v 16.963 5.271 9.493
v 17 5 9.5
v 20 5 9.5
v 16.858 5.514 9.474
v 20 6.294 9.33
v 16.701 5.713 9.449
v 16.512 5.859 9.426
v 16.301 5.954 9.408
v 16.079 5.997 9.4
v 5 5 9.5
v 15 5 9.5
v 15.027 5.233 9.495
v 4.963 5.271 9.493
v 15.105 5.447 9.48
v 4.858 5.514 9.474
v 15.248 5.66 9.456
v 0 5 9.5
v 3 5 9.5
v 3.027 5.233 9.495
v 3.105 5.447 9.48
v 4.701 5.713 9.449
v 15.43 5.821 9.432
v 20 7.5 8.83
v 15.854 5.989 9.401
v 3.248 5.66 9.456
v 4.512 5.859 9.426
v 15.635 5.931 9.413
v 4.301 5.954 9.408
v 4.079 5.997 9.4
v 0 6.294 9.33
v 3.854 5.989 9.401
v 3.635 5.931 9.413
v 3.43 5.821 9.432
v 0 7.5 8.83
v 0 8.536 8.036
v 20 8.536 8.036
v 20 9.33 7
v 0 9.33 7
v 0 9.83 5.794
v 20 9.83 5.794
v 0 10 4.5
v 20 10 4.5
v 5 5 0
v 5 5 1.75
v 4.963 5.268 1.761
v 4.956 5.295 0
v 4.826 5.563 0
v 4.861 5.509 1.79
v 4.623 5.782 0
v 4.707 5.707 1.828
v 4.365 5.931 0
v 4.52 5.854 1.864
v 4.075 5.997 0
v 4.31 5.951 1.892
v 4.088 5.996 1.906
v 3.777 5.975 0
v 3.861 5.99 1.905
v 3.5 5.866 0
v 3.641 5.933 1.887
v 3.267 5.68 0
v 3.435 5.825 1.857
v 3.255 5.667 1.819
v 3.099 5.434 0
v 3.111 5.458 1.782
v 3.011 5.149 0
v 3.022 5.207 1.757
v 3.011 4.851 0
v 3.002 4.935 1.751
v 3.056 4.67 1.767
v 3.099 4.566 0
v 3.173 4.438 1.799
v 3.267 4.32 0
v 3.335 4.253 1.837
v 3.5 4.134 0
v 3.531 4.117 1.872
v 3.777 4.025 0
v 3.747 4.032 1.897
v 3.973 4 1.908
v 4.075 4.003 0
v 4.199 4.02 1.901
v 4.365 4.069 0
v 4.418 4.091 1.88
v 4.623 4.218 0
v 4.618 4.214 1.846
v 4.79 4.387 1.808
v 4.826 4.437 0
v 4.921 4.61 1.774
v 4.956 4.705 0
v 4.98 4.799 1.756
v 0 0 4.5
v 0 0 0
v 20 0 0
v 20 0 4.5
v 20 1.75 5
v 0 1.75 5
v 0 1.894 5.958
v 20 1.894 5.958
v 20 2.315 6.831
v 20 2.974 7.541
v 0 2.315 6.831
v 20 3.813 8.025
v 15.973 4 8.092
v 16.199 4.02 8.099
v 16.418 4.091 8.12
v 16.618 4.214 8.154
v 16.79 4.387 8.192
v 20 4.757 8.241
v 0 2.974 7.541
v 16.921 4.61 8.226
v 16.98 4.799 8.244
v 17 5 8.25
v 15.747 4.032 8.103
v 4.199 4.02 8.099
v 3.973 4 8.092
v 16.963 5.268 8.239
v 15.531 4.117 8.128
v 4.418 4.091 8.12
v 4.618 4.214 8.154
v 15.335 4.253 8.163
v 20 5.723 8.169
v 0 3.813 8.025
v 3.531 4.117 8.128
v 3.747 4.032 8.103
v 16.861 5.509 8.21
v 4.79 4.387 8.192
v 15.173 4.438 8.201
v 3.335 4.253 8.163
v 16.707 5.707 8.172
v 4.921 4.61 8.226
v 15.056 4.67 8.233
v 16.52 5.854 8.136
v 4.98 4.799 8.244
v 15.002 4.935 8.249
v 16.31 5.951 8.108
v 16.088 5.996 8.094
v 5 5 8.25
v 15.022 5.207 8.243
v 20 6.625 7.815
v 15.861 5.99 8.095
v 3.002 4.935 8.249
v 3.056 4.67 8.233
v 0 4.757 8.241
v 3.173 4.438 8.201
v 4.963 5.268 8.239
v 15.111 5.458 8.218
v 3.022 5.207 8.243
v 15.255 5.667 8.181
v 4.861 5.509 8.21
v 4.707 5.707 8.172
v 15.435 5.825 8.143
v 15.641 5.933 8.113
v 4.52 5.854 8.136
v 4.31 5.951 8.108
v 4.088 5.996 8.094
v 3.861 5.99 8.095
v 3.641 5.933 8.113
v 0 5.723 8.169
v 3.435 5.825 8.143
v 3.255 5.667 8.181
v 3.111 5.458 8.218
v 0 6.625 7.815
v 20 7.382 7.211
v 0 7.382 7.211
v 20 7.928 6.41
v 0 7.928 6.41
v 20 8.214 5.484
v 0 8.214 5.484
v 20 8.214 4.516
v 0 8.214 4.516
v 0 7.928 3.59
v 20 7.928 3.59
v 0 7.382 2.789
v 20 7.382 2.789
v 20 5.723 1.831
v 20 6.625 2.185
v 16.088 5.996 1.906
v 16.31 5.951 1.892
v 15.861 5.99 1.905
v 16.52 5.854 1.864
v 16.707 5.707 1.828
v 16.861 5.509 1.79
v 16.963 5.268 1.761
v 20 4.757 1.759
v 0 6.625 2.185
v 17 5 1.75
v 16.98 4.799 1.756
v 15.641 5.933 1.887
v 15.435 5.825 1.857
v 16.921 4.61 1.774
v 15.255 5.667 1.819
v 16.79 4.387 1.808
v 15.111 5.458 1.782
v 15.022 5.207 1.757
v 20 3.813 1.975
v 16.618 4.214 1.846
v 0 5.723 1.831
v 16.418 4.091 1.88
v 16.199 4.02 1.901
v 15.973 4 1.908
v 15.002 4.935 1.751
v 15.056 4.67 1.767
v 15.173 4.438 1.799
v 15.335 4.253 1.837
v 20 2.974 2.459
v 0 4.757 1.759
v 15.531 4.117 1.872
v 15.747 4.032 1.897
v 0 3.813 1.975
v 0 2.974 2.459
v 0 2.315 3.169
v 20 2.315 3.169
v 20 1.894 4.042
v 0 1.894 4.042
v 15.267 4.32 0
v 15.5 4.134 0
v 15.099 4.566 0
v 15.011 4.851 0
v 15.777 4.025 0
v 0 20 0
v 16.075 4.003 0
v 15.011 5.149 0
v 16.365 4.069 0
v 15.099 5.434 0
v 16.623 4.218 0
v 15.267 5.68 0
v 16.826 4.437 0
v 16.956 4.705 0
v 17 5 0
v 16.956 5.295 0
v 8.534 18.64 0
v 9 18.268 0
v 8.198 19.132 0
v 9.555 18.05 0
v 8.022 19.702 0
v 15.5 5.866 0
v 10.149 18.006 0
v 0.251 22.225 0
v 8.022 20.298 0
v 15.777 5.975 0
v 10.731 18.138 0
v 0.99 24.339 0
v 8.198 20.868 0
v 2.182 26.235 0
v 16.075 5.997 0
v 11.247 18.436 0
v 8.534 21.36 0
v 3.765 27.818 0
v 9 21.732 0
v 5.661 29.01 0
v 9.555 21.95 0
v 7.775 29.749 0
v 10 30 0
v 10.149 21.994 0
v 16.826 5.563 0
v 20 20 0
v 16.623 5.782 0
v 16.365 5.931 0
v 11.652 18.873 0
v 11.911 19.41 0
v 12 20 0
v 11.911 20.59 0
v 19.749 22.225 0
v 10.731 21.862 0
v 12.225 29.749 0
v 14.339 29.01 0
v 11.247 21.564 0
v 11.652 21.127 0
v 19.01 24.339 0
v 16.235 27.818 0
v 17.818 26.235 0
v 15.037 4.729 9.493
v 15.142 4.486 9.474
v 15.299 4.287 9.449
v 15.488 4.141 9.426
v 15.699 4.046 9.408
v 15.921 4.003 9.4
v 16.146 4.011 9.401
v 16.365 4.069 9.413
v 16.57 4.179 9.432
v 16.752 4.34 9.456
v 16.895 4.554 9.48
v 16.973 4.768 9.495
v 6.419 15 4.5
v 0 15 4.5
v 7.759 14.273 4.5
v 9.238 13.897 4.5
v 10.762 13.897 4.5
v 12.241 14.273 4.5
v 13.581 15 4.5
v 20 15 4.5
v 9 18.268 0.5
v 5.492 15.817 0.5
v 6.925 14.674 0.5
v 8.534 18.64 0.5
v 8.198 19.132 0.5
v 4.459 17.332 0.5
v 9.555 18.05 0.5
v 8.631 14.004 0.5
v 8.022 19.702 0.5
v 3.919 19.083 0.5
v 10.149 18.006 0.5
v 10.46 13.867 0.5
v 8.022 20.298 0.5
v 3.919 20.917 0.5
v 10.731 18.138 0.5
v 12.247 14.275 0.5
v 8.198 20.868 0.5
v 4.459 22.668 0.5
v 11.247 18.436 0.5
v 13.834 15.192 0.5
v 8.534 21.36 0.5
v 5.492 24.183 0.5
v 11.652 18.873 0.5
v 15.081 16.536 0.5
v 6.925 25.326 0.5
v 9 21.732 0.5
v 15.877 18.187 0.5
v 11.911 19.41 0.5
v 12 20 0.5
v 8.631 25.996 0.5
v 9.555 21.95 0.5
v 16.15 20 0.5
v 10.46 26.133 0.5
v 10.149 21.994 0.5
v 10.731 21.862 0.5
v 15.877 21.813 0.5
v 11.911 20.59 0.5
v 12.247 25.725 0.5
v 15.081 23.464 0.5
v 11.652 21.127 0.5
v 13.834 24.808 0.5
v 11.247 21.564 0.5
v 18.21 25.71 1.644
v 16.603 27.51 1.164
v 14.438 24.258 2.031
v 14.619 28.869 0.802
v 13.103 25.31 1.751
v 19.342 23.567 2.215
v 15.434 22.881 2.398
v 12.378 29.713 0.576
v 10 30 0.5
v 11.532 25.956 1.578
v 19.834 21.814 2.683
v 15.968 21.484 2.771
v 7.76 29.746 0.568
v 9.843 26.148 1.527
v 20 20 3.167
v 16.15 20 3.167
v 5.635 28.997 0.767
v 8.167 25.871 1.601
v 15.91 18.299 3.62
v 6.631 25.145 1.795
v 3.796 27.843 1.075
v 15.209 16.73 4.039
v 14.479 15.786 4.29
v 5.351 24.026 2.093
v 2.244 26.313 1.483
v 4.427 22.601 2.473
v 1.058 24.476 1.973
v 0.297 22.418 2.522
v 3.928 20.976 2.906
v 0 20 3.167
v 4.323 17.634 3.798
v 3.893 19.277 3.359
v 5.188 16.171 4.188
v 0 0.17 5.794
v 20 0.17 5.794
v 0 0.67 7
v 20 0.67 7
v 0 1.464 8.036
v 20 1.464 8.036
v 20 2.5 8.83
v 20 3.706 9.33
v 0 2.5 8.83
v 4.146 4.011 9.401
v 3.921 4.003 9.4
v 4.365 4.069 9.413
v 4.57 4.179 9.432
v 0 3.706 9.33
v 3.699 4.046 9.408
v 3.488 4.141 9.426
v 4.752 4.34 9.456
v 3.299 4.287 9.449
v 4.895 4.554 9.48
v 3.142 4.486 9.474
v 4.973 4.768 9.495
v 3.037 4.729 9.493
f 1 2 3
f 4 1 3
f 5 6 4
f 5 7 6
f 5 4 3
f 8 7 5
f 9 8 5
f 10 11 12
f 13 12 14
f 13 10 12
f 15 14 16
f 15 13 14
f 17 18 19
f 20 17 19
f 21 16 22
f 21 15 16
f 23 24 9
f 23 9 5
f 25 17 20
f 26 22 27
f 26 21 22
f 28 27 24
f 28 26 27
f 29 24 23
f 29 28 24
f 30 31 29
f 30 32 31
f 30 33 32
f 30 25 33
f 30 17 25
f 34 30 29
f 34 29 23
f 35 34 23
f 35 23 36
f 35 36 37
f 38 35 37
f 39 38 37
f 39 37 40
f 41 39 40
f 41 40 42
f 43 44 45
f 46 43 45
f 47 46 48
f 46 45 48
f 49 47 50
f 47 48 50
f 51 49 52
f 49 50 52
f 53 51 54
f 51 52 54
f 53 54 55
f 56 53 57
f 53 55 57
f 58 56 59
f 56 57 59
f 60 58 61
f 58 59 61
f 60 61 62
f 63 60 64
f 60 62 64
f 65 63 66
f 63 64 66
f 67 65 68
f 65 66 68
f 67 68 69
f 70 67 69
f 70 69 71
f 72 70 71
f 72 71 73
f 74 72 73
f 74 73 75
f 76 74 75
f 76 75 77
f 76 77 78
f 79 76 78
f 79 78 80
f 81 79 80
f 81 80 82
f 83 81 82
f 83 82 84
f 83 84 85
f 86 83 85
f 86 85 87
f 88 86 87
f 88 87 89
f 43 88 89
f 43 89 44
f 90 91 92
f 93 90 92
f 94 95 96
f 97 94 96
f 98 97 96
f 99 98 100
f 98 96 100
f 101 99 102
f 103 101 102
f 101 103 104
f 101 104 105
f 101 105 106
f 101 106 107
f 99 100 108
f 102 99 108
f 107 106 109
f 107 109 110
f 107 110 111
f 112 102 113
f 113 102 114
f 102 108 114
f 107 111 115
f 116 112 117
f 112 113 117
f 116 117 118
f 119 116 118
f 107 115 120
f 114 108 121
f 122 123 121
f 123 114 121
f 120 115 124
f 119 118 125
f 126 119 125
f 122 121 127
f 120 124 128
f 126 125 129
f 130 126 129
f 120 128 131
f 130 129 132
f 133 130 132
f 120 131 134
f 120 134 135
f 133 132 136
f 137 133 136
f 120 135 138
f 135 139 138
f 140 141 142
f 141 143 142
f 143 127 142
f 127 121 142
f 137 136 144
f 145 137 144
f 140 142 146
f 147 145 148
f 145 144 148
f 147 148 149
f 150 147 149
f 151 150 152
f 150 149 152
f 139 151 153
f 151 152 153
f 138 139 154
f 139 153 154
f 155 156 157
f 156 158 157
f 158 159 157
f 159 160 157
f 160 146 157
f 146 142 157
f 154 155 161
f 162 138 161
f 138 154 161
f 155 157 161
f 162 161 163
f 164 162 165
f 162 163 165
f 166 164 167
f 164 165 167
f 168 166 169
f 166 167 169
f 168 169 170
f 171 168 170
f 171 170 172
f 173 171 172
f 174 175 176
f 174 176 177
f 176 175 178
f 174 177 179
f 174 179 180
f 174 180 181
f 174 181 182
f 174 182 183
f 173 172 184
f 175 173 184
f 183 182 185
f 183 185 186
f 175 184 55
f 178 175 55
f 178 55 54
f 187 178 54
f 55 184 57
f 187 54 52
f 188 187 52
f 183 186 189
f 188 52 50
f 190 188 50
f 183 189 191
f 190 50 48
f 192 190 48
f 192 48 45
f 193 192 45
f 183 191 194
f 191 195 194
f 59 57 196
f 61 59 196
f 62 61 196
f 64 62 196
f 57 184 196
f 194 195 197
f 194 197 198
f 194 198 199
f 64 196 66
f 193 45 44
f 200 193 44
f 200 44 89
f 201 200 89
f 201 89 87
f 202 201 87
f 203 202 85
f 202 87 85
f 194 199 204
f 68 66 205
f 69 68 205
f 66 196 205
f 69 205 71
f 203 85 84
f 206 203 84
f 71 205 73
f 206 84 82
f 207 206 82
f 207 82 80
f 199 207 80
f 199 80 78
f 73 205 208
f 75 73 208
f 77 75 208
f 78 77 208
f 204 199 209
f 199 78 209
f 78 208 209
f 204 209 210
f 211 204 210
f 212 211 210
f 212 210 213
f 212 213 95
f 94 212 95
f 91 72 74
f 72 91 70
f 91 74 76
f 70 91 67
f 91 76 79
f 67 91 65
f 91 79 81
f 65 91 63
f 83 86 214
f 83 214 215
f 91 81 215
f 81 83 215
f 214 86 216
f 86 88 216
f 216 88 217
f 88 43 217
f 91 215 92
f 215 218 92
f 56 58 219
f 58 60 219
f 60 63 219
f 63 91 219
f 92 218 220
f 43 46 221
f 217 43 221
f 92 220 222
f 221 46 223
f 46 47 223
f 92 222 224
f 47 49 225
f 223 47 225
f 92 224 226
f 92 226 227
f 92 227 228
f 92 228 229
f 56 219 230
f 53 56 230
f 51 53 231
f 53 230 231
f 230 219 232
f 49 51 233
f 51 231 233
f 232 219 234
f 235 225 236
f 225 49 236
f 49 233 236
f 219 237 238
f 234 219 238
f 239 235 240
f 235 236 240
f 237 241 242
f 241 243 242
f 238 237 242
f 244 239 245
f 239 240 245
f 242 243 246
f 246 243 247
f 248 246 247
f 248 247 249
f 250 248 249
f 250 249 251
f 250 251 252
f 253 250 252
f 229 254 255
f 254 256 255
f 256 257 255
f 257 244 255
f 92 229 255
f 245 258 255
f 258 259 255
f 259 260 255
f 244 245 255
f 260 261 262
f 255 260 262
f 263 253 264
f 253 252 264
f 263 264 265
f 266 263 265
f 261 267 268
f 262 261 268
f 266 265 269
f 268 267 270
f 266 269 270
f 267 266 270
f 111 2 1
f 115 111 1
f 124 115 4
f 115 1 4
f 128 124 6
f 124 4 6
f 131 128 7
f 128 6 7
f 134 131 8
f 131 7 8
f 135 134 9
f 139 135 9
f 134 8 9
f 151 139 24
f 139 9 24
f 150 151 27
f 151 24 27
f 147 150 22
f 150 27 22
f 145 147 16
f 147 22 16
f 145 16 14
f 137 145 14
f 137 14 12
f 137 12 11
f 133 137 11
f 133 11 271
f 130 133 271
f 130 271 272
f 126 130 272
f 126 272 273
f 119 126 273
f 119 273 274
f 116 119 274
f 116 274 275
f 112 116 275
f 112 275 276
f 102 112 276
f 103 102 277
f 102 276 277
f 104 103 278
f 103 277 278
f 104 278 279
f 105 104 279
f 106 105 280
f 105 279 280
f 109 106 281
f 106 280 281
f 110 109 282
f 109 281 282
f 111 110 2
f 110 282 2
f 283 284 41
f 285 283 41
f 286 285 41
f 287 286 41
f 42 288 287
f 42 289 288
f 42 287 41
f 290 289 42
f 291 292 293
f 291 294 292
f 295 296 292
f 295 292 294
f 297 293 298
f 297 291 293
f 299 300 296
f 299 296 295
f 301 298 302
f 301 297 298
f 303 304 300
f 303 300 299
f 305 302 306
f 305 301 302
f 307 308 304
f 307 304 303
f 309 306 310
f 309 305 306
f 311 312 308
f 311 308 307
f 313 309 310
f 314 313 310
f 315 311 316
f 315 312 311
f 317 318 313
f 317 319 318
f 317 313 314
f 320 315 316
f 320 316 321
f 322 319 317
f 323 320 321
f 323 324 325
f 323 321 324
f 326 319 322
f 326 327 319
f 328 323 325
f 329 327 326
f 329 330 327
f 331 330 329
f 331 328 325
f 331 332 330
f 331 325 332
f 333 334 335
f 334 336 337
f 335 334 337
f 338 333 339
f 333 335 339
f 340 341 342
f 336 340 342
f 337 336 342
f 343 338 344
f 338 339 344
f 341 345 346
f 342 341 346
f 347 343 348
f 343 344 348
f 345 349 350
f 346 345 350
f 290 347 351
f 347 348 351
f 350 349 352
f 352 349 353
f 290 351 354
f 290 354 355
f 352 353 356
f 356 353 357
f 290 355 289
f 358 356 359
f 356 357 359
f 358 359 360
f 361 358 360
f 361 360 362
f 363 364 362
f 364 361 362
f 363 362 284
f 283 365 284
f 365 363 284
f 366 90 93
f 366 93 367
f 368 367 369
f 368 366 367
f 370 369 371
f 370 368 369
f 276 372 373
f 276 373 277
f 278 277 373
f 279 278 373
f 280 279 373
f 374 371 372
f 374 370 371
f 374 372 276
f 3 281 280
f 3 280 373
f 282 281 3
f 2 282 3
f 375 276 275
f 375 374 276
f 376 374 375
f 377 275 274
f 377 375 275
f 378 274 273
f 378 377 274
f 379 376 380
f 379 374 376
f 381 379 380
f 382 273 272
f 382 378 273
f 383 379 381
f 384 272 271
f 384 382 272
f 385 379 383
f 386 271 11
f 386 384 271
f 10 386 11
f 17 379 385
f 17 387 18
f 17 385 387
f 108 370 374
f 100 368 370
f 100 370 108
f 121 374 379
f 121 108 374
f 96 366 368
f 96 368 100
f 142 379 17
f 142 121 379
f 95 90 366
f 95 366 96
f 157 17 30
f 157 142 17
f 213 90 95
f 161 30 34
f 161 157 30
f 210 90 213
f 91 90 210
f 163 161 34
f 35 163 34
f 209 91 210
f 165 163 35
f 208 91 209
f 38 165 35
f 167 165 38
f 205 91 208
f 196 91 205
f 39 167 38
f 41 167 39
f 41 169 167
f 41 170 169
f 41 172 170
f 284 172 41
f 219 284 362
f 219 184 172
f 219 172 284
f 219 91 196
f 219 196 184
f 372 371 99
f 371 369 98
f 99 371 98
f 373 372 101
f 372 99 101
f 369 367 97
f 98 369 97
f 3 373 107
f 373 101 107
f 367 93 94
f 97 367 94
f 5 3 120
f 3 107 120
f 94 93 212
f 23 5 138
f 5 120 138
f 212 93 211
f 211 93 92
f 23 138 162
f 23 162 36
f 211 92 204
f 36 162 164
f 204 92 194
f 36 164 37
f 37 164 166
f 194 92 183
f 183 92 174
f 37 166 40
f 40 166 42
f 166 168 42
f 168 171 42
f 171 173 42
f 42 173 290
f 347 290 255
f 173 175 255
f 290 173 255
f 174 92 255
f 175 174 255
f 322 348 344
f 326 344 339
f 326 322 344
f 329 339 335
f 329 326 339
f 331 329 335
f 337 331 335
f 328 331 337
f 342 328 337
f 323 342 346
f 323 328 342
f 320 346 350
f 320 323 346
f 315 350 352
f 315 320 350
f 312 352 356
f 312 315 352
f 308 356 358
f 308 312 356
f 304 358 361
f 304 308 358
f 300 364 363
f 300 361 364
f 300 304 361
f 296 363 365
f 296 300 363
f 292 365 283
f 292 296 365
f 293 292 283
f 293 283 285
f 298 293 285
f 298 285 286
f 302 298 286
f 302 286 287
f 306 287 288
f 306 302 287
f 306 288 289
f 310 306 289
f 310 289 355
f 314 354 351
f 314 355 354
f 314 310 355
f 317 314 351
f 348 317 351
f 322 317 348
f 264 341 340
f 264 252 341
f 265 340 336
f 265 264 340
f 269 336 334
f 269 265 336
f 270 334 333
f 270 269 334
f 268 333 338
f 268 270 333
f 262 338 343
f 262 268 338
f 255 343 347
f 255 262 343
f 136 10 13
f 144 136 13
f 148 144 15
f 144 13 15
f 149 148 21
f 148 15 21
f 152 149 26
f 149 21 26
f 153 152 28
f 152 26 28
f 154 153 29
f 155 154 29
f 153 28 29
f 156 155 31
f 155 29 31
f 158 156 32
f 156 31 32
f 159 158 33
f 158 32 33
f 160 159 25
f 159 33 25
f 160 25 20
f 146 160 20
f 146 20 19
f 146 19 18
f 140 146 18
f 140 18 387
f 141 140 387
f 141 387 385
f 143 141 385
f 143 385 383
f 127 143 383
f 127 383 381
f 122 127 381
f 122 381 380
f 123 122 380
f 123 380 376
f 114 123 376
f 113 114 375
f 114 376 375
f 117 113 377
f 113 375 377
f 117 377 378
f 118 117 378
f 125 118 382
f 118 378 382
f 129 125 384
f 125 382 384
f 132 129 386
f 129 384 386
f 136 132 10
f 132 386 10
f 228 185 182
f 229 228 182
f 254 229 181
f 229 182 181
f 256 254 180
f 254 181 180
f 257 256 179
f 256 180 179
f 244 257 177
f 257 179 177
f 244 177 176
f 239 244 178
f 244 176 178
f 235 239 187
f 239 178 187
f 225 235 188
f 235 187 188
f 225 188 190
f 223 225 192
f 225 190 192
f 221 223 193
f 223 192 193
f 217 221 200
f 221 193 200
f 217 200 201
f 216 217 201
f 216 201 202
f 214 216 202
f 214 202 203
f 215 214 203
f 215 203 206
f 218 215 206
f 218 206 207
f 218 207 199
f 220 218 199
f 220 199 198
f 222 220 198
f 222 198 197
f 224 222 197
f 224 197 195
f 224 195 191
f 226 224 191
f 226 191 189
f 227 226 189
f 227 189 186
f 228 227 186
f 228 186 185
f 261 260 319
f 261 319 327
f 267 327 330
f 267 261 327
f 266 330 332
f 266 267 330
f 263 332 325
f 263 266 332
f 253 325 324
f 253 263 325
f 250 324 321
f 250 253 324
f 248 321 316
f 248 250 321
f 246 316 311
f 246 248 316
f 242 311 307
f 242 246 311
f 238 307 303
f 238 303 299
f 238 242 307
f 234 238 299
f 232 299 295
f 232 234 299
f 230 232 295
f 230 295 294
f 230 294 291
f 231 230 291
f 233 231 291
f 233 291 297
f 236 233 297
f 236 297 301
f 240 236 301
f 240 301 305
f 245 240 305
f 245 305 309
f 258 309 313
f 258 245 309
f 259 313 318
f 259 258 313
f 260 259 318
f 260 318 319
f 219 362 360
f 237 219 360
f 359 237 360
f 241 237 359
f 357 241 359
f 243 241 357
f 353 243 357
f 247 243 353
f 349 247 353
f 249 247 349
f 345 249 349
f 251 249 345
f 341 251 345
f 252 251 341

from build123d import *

# Parameters (mm, degrees)
F0_W         = 20
F0_H         = 30
F0_R         = 6.15
F1_DEPTH     = 4
F1_FACE_W    = 20
F1_FACE_H    = 30
F1_FACE_R    = 6.15
F0_R_2       = 2
F2_DEPTH     = 0.5
F3_W         = 20
F3_H         = 10
F4_DEPTH     = 5
F5_R         = 3.25
F6_DEPTH     = 25
F7_T1_DEPTH  = 97.9025398997
F8_R         = 9.99999
F9_R         = 1
F10_DEPTH    = 25
F11_T1_DEPTH = 45


# Not quite as in the source:
# - a fillet or chamfer that OpenCascade refuses, or shapes differently, is made with other operations: its cross-section is extruded or revolved along the edge and cut away or added
# - a fillet or chamfer is up to 0.001 mm smaller than in the source, because OpenCascade refuses the exact size
# - a feature names something its author has since deleted; it is built from what else it names


with BuildPart() as f1:
    # F0 (on Top) → F1 (new body)
    with BuildSketch(Plane.XY):
        with Locations((10, 15)):
            Rectangle(F0_W, F0_H)
        with Locations((10, 20)):
            Circle(F0_R, mode=Mode.SUBTRACT)
    extrude(amount=F1_DEPTH)

    # F1_face (on face) + F0 (on Top) → F2 (join)
    with BuildSketch(Plane(origin=(10, 13.7652894827, 4), x_dir=(1, 0, 0), z_dir=(0, 0, 1))):
        with Locations((0, 1.2347105173)):
            Rectangle(F1_FACE_W, F1_FACE_H)
        with Locations((0, 6.2347105173)):
            Circle(F1_FACE_R, mode=Mode.SUBTRACT)
    with BuildSketch(Plane.XY):
        with Locations((10, 20)):
            Circle(F0_R)
        with Locations((10, 20)):
            Circle(F0_R_2, mode=Mode.SUBTRACT)
    extrude(amount=F2_DEPTH)

    # F3 (on face) → F4 (join)
    with BuildSketch(Plane.XY.offset(4.5)):
        with Locations((10, 5)):
            Rectangle(F3_W, F3_H)
    extrude(amount=F4_DEPTH)

    # F5 (on face) → F6 (cut)
    with BuildSketch(Plane(origin=(0, 0, 0), x_dir=(0, -1, 0), z_dir=(-1, 0, 0))):
        with Locations((-5, 5)):
            Circle(F5_R)
    extrude(amount=-F6_DEPTH, mode=Mode.SUBTRACT)

    # F7: chamfer of 4 x 15 on 1 edges, made by hand

    # F7_s2 → F7_t1 (cut)
    with BuildSketch(Plane.YZ.offset(-38.9512699498)):
        Polygon((30, 0.5), (15, 4.5), (30, 4.5), align=None)
    extrude(amount=F7_T1_DEPTH, mode=Mode.SUBTRACT)

    # F8 (radius 10 in the source; OpenCascade refuses exactly that, so slightly less here)
    f8_edges = [f1.edges().sort_by_distance(p)[0] for p in [
        (0, 30, 0.25),
        (20, 30, 0.25),
    ]]
    fillet(f8_edges, radius=F8_R)

    # F9 (on face) → F10 (cut)
    with BuildSketch(Plane.XY.offset(9.5)):
        with Locations((4, 5)):
            Circle(F9_R)
        with Locations((16, 5)):
            Circle(F9_R)
    extrude(amount=-F10_DEPTH, mode=Mode.SUBTRACT)

    # F11: fillet of radius 5 on 2 edges, made by hand

    # F11_s2 → F11_t1 (cut)
    with BuildSketch(Plane.YZ.offset(-12.5)):
        with BuildLine():
            ThreePointArc((0, 4.5), (1.4644660941, 8.0355339059), (5, 9.5))
            Line((5, 9.5), (0, 9.5))
            Line((0, 9.5), (0, 4.5))
        make_face()
        with BuildLine():
            ThreePointArc((5, 9.5), (8.5355339059, 8.0355339059), (10, 4.5))
            Line((10, 4.5), (10, 9.5))
            Line((10, 9.5), (5, 9.5))
        make_face()
    extrude(amount=F11_T1_DEPTH, mode=Mode.SUBTRACT)


solid = f1.part
